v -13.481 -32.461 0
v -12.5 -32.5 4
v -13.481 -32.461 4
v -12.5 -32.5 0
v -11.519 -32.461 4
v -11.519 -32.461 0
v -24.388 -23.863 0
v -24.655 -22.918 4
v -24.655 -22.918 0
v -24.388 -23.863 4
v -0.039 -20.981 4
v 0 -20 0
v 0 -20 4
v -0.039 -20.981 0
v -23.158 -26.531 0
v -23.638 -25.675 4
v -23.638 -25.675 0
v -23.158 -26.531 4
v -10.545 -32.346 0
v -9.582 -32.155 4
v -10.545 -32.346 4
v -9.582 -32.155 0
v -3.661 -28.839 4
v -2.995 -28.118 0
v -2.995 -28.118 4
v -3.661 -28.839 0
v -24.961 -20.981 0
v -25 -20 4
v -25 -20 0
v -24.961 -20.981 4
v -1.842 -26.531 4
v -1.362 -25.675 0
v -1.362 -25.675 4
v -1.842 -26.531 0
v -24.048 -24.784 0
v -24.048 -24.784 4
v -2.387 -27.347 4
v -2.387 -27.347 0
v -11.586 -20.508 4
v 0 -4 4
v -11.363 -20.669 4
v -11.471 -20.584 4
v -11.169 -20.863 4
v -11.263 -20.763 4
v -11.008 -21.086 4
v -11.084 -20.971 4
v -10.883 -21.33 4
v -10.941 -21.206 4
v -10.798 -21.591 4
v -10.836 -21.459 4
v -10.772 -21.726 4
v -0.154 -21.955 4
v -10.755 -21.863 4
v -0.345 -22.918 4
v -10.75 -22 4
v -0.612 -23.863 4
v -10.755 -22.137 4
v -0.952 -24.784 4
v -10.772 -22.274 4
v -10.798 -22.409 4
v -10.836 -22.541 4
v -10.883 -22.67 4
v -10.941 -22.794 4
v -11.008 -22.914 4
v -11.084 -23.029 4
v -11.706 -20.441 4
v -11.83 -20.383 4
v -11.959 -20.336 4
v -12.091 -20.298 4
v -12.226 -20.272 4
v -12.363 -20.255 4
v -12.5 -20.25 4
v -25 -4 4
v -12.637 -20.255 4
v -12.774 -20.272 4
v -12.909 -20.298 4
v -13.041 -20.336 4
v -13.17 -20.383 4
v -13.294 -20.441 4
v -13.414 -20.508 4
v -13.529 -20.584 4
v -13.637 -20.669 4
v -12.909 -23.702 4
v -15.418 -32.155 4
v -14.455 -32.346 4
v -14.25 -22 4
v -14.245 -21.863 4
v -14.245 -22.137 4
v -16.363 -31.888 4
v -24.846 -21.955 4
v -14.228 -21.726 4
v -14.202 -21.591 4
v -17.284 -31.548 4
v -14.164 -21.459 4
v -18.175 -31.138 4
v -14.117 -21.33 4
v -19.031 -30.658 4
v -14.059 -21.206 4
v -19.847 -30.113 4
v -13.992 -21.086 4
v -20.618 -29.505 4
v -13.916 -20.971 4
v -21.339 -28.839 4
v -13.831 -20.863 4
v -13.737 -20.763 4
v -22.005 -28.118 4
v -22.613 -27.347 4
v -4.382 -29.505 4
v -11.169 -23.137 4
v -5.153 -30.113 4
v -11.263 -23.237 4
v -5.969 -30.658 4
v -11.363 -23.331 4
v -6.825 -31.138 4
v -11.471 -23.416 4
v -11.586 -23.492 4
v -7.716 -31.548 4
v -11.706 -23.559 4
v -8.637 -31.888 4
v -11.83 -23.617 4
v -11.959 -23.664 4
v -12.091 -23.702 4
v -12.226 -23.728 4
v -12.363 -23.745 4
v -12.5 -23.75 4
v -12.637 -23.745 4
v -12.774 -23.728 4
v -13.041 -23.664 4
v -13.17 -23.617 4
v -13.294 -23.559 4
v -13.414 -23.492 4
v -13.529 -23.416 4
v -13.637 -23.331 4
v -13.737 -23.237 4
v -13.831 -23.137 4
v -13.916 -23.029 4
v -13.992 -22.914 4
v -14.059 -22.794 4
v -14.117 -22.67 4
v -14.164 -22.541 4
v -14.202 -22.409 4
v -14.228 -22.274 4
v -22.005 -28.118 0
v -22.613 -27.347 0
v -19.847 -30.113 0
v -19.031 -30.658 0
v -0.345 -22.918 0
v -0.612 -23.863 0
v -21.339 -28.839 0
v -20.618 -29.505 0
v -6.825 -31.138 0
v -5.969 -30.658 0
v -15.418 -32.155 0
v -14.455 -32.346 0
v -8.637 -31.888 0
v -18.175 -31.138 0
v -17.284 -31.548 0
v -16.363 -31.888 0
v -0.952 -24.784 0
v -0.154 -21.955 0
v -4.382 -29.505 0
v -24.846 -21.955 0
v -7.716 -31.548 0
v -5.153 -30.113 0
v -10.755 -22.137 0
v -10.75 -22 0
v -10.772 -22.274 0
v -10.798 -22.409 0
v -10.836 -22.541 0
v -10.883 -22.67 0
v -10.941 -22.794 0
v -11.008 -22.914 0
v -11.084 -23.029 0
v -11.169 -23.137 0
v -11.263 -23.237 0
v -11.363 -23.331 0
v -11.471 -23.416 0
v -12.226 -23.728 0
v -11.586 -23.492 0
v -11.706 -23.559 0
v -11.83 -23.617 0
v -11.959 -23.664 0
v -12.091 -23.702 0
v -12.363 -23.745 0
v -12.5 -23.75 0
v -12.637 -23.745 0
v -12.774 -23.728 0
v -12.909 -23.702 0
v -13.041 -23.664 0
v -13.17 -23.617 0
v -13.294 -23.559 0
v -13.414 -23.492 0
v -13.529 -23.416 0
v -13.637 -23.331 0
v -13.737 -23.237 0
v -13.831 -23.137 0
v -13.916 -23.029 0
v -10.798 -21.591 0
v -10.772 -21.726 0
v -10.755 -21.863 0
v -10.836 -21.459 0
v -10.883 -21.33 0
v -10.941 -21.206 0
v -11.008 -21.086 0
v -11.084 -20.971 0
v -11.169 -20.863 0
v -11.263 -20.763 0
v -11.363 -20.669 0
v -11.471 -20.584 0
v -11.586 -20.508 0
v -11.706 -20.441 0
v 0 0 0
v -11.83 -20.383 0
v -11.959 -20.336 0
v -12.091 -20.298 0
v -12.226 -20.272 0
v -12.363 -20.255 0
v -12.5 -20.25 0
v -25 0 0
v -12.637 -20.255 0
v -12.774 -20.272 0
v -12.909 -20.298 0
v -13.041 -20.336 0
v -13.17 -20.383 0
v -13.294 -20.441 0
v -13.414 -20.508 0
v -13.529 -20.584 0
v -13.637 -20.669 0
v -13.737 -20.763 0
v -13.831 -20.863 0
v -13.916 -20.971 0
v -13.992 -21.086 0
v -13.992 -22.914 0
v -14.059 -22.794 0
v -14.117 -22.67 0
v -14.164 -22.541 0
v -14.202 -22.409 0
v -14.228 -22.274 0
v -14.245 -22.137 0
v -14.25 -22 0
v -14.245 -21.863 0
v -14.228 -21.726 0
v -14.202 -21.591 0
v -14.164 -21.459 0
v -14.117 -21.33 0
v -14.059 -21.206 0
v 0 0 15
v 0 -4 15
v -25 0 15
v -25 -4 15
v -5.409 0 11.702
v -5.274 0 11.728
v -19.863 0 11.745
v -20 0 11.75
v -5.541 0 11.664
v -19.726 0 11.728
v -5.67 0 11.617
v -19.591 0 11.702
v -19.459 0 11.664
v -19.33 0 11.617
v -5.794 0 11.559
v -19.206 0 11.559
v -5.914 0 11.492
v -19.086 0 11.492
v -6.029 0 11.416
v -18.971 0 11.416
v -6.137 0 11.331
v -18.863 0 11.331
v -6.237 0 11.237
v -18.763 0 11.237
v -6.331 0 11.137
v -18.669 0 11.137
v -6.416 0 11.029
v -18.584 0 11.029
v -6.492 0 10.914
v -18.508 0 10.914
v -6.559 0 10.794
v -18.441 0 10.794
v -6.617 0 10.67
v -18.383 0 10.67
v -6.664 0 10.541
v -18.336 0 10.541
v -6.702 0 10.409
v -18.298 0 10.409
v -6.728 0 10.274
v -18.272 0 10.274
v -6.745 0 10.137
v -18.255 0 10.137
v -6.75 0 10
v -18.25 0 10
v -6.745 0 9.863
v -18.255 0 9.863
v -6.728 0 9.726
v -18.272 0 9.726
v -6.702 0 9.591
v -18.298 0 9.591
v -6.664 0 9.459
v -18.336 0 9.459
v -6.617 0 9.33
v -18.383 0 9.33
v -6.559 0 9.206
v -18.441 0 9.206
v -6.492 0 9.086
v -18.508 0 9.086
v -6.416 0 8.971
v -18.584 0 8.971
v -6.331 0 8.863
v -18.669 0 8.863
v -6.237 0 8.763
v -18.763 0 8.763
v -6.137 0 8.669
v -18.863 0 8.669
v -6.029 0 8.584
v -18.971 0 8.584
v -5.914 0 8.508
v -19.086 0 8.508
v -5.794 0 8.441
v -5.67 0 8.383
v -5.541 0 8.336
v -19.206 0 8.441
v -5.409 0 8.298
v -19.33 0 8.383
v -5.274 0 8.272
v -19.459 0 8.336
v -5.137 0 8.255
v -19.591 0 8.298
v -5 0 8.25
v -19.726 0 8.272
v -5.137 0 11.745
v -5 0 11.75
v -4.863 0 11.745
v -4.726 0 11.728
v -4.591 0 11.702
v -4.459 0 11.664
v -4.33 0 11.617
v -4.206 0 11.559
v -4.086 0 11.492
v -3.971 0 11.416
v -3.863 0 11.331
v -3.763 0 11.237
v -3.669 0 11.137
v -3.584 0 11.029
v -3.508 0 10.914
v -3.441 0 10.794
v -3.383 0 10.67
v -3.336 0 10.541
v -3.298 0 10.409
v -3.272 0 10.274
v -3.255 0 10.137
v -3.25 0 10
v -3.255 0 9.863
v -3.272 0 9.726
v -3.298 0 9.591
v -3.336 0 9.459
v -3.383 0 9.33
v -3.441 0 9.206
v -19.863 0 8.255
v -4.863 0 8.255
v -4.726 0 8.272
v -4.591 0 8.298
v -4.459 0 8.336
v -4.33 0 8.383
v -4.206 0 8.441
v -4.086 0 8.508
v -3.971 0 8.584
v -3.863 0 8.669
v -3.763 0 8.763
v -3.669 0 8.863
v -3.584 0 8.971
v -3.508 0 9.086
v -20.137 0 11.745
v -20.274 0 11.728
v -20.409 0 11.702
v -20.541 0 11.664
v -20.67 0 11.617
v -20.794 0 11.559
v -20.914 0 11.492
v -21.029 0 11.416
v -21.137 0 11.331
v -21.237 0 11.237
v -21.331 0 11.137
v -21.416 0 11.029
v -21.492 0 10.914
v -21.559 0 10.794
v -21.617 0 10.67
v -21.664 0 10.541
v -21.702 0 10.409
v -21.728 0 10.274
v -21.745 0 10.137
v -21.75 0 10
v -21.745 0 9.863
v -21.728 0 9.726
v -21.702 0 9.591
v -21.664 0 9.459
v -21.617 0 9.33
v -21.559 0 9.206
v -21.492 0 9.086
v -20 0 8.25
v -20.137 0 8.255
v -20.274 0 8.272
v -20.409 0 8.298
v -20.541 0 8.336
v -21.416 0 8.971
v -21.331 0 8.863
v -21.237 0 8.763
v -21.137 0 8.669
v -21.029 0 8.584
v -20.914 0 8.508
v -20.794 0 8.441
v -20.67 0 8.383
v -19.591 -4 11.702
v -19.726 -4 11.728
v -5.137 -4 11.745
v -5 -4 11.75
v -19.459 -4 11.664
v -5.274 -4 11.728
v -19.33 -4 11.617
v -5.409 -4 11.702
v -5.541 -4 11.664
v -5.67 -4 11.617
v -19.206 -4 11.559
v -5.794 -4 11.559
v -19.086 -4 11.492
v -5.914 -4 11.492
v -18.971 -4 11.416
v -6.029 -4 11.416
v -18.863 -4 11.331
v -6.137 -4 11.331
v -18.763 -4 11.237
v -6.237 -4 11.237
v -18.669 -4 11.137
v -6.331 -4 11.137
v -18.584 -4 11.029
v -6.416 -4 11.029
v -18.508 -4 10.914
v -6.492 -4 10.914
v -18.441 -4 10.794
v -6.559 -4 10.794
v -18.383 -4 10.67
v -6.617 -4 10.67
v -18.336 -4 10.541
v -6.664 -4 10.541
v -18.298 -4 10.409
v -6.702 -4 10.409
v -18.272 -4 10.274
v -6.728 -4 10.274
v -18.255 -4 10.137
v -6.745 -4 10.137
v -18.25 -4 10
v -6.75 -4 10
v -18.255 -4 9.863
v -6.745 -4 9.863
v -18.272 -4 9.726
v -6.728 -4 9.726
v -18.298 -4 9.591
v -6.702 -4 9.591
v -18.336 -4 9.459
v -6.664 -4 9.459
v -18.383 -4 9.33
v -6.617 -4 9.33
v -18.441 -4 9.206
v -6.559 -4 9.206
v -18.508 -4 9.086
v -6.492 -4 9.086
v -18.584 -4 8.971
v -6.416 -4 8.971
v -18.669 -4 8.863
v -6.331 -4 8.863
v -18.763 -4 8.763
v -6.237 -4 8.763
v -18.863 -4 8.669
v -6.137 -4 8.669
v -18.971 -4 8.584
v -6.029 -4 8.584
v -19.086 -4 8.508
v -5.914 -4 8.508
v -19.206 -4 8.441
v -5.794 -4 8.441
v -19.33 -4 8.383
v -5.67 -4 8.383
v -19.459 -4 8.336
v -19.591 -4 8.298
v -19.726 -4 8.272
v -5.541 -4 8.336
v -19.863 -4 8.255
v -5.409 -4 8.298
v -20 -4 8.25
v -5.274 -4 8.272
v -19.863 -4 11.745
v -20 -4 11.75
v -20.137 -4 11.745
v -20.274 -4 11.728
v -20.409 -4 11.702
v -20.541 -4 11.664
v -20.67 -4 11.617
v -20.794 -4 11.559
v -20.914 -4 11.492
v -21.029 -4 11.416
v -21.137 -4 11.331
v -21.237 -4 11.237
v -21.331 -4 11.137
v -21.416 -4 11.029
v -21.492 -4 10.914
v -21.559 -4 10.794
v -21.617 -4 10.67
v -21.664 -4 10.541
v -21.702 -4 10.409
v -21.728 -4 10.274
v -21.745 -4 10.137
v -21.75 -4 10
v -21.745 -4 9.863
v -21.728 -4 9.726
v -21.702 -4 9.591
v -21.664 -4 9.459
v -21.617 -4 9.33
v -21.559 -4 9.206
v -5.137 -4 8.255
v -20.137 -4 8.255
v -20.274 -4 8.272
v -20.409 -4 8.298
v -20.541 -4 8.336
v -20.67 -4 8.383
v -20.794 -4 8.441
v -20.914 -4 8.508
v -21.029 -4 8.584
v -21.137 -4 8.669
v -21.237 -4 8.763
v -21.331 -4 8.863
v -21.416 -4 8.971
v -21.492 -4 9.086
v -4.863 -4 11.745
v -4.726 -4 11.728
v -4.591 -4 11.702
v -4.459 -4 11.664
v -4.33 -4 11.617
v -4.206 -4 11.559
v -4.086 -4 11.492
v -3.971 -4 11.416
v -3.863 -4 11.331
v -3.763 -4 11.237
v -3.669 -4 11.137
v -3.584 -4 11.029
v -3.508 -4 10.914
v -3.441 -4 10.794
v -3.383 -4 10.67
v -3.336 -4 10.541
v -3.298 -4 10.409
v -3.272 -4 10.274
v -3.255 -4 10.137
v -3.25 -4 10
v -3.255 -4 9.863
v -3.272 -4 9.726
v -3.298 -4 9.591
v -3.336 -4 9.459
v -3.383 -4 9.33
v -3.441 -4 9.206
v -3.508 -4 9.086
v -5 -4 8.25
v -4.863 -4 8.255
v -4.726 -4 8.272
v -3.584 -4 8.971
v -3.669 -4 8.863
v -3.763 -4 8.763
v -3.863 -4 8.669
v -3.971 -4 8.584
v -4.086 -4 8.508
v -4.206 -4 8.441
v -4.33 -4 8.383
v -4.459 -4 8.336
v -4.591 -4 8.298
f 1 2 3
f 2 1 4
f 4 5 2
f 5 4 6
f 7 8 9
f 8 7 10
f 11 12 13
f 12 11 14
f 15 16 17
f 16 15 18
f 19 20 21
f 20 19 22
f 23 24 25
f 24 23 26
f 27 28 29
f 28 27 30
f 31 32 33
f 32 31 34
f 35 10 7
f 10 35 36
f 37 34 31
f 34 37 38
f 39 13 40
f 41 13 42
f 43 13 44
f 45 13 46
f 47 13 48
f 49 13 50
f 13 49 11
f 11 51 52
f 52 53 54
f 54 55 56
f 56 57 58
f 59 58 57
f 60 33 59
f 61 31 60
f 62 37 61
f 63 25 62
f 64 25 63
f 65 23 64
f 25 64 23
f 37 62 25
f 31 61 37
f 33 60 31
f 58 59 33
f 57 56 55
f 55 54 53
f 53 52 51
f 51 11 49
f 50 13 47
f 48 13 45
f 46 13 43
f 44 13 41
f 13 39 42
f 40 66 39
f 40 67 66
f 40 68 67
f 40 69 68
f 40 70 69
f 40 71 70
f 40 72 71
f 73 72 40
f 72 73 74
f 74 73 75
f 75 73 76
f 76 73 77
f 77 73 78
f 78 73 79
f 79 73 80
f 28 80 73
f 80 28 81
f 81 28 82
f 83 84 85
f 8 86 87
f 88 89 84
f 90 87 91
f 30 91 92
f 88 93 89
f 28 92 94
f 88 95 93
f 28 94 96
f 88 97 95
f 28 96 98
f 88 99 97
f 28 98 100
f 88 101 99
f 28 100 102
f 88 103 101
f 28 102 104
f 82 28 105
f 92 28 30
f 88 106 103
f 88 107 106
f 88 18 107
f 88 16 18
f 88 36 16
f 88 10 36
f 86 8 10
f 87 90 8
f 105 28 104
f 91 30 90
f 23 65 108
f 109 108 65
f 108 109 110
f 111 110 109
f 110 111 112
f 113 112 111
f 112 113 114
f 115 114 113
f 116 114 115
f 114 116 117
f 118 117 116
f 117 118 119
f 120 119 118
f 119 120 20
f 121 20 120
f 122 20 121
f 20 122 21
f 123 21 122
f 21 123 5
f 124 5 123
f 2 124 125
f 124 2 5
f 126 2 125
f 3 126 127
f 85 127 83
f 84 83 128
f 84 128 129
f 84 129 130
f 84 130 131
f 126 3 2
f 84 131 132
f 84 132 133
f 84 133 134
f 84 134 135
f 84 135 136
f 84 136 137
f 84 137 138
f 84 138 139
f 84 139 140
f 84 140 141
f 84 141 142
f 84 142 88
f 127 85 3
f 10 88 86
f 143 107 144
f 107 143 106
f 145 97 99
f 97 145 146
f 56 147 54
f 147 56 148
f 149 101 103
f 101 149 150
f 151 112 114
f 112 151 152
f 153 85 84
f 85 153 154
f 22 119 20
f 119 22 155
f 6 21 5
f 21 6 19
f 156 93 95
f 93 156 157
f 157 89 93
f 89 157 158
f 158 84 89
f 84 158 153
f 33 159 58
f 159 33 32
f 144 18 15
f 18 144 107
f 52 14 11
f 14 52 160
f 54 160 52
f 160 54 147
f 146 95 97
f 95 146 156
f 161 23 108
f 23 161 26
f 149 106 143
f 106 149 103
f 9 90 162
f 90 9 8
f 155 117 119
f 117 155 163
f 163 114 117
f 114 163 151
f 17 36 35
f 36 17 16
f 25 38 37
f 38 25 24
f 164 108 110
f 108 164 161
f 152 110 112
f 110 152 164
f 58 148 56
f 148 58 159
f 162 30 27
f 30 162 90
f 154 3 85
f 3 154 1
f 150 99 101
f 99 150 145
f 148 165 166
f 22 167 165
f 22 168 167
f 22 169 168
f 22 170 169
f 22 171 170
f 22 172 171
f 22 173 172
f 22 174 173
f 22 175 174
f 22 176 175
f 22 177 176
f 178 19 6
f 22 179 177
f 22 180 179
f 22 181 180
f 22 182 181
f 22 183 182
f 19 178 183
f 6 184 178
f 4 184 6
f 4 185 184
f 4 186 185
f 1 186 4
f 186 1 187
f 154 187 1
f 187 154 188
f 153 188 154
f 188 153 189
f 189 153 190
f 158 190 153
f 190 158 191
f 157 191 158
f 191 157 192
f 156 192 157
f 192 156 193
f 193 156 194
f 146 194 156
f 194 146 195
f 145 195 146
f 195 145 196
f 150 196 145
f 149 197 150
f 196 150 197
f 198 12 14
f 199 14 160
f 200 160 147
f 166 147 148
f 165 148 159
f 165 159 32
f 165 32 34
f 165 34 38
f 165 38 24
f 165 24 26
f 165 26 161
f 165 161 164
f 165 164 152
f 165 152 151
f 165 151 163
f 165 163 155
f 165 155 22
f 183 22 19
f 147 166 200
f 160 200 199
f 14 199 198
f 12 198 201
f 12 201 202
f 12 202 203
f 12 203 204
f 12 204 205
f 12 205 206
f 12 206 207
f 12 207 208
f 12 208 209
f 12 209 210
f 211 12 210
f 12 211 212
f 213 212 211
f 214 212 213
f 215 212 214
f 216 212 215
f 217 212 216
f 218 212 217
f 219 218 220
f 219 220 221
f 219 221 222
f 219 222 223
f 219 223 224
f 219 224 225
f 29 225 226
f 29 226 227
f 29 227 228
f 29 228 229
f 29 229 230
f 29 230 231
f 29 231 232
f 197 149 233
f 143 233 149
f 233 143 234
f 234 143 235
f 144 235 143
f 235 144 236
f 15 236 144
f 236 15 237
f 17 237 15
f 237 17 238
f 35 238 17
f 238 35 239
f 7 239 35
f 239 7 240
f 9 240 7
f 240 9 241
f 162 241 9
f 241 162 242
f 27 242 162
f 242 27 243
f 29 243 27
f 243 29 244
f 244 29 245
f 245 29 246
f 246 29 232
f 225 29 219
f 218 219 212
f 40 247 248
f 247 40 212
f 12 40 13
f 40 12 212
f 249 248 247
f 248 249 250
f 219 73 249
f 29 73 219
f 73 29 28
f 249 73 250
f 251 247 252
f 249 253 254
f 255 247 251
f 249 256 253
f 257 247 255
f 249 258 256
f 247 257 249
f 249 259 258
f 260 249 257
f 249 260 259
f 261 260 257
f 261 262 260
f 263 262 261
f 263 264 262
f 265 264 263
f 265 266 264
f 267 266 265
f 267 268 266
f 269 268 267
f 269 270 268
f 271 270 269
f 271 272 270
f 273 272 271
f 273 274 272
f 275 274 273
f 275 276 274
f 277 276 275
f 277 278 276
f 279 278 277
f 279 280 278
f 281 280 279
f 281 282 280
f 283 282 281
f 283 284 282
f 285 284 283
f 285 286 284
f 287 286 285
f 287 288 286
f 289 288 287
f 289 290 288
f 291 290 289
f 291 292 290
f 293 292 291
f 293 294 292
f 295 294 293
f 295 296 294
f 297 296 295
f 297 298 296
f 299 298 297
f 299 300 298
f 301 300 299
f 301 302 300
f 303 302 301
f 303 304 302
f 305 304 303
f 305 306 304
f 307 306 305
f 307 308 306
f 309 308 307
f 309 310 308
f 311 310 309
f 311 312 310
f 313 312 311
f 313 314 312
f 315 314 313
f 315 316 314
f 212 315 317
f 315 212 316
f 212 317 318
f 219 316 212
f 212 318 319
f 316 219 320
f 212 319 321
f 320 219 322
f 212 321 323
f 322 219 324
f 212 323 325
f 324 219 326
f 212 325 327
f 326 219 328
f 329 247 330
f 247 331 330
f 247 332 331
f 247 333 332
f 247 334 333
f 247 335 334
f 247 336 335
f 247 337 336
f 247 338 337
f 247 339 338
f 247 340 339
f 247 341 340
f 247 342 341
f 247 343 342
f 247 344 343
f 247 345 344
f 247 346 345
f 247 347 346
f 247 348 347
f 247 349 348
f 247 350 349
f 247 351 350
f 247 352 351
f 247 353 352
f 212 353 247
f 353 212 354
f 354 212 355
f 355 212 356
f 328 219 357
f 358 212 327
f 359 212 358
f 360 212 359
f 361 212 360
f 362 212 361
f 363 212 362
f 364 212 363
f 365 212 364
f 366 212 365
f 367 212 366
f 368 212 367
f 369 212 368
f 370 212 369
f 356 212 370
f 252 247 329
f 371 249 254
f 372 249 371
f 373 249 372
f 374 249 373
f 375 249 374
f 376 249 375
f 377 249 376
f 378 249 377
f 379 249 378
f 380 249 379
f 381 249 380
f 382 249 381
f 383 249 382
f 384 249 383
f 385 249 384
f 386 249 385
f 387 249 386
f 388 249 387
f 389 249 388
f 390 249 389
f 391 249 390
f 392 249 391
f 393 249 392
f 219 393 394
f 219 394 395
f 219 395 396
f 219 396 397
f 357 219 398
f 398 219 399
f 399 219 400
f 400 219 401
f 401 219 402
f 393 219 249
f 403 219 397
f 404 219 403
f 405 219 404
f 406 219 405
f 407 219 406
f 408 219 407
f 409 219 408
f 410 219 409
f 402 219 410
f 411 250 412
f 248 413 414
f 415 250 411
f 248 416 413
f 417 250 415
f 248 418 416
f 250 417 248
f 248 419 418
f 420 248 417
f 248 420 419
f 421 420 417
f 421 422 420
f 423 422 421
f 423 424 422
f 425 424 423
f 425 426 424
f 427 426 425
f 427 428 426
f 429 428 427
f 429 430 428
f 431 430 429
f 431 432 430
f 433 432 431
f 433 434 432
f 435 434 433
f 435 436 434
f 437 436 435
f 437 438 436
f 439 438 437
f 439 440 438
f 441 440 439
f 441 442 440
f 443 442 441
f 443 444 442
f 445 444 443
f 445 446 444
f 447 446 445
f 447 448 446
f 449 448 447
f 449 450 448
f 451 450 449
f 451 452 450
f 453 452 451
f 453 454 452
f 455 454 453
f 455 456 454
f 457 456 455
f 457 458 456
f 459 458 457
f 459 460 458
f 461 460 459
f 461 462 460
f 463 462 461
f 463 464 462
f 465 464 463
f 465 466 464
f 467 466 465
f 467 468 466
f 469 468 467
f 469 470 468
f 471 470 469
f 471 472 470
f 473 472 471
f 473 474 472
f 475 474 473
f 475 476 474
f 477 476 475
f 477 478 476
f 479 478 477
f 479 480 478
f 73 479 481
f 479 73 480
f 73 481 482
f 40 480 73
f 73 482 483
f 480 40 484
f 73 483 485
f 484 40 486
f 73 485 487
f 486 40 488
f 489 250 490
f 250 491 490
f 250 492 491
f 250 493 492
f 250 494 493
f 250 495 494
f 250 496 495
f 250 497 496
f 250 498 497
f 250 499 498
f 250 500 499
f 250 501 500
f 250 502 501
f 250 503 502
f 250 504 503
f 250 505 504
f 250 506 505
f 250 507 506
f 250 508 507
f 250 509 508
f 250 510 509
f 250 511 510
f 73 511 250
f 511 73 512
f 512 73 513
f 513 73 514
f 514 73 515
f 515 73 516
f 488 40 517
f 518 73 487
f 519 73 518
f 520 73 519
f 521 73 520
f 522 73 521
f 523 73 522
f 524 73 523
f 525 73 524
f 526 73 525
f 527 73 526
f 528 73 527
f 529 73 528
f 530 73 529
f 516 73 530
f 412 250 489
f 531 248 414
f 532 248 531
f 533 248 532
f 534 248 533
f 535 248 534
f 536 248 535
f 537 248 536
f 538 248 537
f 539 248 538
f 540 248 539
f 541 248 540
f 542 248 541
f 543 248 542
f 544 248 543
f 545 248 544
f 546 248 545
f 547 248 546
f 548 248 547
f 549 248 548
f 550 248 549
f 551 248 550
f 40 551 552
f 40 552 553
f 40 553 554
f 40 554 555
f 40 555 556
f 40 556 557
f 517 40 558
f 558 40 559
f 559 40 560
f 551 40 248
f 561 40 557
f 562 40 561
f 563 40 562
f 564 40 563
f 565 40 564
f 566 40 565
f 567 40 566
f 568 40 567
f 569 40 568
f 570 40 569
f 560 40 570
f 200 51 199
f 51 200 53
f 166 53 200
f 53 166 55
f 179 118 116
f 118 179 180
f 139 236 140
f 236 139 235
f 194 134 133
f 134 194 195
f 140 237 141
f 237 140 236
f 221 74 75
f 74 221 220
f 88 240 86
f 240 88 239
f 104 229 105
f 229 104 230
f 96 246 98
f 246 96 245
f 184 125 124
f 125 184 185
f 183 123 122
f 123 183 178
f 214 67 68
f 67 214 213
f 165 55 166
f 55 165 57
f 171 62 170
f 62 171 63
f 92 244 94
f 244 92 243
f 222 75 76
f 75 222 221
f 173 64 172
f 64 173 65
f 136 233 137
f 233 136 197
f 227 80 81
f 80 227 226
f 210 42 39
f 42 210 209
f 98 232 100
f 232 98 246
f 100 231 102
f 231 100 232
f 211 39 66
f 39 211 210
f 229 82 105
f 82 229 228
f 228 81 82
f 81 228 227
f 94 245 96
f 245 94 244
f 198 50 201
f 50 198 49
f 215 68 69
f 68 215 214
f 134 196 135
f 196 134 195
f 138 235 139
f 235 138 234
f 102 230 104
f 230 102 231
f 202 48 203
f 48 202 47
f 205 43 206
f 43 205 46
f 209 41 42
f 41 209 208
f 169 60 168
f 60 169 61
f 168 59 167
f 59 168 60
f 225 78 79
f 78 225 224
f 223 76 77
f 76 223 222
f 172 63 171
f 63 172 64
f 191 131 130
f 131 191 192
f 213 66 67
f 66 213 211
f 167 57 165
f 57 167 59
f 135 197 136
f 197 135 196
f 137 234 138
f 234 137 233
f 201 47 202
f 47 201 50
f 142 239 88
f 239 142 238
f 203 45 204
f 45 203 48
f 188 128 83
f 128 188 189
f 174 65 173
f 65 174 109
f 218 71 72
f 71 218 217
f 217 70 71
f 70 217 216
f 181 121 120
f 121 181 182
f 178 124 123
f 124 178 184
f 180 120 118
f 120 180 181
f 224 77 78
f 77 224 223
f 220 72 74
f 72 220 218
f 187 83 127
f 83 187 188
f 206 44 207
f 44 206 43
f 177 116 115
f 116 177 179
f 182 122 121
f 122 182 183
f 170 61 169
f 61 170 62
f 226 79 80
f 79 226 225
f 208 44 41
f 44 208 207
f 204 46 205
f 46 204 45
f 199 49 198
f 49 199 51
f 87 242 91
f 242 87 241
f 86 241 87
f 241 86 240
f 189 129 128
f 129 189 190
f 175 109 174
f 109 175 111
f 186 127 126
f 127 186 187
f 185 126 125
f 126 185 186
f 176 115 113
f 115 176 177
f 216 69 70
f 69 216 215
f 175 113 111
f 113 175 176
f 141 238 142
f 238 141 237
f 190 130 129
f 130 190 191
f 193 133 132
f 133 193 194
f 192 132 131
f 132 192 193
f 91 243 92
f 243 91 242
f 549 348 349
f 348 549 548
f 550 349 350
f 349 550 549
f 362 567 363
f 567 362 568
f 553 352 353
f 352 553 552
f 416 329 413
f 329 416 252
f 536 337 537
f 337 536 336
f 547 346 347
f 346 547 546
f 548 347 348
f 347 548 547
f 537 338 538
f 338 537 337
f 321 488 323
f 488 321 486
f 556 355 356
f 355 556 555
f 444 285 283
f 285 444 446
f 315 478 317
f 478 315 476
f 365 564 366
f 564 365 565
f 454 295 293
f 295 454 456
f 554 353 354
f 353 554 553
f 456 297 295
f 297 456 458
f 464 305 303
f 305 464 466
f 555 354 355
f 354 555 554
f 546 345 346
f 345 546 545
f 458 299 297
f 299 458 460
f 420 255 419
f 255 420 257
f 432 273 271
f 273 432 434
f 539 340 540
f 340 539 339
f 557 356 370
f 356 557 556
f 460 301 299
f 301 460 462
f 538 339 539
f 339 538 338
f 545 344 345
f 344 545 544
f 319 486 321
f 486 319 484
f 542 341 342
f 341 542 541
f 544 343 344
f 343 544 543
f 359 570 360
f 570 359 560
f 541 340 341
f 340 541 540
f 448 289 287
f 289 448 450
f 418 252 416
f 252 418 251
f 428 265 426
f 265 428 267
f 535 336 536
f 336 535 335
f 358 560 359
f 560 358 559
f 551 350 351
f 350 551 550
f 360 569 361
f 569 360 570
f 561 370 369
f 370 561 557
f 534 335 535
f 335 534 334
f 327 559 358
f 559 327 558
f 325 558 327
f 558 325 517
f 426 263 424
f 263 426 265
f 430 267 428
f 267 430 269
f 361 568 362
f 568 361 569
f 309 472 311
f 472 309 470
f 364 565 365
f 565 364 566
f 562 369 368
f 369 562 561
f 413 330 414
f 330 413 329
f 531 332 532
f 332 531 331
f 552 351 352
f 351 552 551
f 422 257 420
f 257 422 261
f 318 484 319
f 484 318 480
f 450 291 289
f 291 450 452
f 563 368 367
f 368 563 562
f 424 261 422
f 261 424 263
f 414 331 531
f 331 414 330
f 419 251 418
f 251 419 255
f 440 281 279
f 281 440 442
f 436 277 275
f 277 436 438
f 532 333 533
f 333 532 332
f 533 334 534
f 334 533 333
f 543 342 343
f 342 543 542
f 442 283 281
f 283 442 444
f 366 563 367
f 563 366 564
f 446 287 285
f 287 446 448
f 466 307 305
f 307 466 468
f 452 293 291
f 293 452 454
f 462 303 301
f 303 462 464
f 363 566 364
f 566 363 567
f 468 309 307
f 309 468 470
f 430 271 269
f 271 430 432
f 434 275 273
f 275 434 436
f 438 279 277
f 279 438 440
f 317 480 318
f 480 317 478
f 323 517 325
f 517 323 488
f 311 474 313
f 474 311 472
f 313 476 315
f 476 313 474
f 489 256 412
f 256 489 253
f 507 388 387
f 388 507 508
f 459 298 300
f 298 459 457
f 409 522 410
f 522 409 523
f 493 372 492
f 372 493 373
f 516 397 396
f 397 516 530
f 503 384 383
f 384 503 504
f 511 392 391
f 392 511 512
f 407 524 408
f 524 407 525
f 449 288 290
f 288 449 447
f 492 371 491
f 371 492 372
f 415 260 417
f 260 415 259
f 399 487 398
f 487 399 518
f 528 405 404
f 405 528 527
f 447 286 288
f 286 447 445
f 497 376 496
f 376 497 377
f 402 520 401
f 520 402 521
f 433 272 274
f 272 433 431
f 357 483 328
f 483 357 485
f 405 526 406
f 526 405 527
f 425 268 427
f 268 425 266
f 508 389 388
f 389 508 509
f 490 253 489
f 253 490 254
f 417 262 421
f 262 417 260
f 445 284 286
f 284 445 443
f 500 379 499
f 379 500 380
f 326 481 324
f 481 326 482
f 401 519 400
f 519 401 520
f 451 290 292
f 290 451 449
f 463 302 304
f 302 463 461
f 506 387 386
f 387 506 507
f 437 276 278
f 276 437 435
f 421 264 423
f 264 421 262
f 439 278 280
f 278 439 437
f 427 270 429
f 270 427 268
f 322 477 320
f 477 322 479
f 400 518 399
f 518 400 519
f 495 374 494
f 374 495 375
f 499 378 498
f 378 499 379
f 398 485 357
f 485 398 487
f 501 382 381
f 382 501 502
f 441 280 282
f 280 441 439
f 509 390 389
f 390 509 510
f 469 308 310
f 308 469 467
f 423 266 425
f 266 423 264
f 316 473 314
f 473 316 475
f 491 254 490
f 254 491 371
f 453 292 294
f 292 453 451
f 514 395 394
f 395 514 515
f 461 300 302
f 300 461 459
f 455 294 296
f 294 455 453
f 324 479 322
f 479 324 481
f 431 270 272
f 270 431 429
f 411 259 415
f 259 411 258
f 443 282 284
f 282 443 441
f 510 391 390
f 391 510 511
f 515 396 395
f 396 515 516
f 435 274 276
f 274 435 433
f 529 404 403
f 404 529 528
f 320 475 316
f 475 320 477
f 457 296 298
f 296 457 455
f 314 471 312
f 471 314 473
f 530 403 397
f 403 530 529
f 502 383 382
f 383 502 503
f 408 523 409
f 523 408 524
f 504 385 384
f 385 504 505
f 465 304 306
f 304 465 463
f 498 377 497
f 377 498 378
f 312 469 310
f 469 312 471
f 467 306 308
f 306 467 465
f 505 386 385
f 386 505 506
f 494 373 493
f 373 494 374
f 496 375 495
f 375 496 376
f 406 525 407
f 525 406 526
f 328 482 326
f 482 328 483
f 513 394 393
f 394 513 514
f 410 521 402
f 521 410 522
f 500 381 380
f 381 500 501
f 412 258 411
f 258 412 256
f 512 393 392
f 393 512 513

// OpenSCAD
/*
**  cameraStand for Logi camera
**
**  Date : 10-02-2022
**
*/

$fn=80;

//----------------------------------------------------------------
module base()
{
  difference()
  {
    union()
    {
      translate([-12.5,-20,0]) rotate([0,0,0]) cylinder(d=25, h=4);
      translate([-25,-4,0]) color("blue") cube([25,4,15]);
      translate([-25,-20,0]) color("green") cube([25,17,4]);
    }
    //-- swiffel screw hole in cameraMount
    translate([-12.5,-22,-10]) 
       color("red") cylinder(d=3.5, h=16);
    //-- holes for mounting the base
    translate([-5,3,10]) 
       rotate([90,0,0]) color("red") cylinder(d=3.5, h=16);
    translate([-20,3,10]) 
       rotate([90,0,0]) color("red") cylinder(d=3.5, h=16);

  } // difference
  
} // base()


//----------------------------------------------------------------
module cameraMount()
{
  rotate([90,0,0]) 
  {
    difference()
    {
      cylinder(r=25, h=25);
      //-- cutoff top
      translate([-28,-25,-1]) color("blue") cube([25,60,27]);
      //-- cutoff bottom
      translate([-20,14,-1]) color("orange") cube([60,25,27]);
      //-- remove inner circle
      translate([0,0,-1]) cylinder(r=20, h=27);
    }
  }
  //-- connection to camera hooks
  translate([12,-25,11]) rotate([0,10,0])  cube([8,25,4]);
  
} // cameraMount()


//----------------------------------------------------------------
module cameraConnector()
{
  translate([10.5,0,13])
  {
    rotate([90,0,0]) 
    {
      difference()
      {
        color("red") cylinder(h=25, d=6);
        translate([0,0,-2]) color("blue") cylinder(h=30, d=3.4);
        //translate([-10,-1.5,9]) rotate([0,0,-10]) cube([15,7,8]);
      }
    } //  rotate
  } // translate

} //  cameraConnector()

//----------------------------------------------------------------
module swiffelPlate()
{
  difference()
  {
    translate([-10,-12.5,-23]) rotate([0,5,0]) cylinder(d=25, h=5);
    translate([-10,-25,-25]) cube([15,25,8]);
    translate([-17,-12.5,-25]) rotate([0,5,0]) cylinder(d=3.5, h=8);
  }
} // swiffel()
//============ main program ===============

base();

/*
difference()
{
  union()
  {
    cameraMount();
    cameraConnector();
    translate([7,0,-1.8]) swiffelPlate();
  }
  
  //-- cap in cameraConnector
  translate([-1,-15.5,11]) rotate([0,10,0]) cube([15,7,8]);
  
} //  difference
*/
